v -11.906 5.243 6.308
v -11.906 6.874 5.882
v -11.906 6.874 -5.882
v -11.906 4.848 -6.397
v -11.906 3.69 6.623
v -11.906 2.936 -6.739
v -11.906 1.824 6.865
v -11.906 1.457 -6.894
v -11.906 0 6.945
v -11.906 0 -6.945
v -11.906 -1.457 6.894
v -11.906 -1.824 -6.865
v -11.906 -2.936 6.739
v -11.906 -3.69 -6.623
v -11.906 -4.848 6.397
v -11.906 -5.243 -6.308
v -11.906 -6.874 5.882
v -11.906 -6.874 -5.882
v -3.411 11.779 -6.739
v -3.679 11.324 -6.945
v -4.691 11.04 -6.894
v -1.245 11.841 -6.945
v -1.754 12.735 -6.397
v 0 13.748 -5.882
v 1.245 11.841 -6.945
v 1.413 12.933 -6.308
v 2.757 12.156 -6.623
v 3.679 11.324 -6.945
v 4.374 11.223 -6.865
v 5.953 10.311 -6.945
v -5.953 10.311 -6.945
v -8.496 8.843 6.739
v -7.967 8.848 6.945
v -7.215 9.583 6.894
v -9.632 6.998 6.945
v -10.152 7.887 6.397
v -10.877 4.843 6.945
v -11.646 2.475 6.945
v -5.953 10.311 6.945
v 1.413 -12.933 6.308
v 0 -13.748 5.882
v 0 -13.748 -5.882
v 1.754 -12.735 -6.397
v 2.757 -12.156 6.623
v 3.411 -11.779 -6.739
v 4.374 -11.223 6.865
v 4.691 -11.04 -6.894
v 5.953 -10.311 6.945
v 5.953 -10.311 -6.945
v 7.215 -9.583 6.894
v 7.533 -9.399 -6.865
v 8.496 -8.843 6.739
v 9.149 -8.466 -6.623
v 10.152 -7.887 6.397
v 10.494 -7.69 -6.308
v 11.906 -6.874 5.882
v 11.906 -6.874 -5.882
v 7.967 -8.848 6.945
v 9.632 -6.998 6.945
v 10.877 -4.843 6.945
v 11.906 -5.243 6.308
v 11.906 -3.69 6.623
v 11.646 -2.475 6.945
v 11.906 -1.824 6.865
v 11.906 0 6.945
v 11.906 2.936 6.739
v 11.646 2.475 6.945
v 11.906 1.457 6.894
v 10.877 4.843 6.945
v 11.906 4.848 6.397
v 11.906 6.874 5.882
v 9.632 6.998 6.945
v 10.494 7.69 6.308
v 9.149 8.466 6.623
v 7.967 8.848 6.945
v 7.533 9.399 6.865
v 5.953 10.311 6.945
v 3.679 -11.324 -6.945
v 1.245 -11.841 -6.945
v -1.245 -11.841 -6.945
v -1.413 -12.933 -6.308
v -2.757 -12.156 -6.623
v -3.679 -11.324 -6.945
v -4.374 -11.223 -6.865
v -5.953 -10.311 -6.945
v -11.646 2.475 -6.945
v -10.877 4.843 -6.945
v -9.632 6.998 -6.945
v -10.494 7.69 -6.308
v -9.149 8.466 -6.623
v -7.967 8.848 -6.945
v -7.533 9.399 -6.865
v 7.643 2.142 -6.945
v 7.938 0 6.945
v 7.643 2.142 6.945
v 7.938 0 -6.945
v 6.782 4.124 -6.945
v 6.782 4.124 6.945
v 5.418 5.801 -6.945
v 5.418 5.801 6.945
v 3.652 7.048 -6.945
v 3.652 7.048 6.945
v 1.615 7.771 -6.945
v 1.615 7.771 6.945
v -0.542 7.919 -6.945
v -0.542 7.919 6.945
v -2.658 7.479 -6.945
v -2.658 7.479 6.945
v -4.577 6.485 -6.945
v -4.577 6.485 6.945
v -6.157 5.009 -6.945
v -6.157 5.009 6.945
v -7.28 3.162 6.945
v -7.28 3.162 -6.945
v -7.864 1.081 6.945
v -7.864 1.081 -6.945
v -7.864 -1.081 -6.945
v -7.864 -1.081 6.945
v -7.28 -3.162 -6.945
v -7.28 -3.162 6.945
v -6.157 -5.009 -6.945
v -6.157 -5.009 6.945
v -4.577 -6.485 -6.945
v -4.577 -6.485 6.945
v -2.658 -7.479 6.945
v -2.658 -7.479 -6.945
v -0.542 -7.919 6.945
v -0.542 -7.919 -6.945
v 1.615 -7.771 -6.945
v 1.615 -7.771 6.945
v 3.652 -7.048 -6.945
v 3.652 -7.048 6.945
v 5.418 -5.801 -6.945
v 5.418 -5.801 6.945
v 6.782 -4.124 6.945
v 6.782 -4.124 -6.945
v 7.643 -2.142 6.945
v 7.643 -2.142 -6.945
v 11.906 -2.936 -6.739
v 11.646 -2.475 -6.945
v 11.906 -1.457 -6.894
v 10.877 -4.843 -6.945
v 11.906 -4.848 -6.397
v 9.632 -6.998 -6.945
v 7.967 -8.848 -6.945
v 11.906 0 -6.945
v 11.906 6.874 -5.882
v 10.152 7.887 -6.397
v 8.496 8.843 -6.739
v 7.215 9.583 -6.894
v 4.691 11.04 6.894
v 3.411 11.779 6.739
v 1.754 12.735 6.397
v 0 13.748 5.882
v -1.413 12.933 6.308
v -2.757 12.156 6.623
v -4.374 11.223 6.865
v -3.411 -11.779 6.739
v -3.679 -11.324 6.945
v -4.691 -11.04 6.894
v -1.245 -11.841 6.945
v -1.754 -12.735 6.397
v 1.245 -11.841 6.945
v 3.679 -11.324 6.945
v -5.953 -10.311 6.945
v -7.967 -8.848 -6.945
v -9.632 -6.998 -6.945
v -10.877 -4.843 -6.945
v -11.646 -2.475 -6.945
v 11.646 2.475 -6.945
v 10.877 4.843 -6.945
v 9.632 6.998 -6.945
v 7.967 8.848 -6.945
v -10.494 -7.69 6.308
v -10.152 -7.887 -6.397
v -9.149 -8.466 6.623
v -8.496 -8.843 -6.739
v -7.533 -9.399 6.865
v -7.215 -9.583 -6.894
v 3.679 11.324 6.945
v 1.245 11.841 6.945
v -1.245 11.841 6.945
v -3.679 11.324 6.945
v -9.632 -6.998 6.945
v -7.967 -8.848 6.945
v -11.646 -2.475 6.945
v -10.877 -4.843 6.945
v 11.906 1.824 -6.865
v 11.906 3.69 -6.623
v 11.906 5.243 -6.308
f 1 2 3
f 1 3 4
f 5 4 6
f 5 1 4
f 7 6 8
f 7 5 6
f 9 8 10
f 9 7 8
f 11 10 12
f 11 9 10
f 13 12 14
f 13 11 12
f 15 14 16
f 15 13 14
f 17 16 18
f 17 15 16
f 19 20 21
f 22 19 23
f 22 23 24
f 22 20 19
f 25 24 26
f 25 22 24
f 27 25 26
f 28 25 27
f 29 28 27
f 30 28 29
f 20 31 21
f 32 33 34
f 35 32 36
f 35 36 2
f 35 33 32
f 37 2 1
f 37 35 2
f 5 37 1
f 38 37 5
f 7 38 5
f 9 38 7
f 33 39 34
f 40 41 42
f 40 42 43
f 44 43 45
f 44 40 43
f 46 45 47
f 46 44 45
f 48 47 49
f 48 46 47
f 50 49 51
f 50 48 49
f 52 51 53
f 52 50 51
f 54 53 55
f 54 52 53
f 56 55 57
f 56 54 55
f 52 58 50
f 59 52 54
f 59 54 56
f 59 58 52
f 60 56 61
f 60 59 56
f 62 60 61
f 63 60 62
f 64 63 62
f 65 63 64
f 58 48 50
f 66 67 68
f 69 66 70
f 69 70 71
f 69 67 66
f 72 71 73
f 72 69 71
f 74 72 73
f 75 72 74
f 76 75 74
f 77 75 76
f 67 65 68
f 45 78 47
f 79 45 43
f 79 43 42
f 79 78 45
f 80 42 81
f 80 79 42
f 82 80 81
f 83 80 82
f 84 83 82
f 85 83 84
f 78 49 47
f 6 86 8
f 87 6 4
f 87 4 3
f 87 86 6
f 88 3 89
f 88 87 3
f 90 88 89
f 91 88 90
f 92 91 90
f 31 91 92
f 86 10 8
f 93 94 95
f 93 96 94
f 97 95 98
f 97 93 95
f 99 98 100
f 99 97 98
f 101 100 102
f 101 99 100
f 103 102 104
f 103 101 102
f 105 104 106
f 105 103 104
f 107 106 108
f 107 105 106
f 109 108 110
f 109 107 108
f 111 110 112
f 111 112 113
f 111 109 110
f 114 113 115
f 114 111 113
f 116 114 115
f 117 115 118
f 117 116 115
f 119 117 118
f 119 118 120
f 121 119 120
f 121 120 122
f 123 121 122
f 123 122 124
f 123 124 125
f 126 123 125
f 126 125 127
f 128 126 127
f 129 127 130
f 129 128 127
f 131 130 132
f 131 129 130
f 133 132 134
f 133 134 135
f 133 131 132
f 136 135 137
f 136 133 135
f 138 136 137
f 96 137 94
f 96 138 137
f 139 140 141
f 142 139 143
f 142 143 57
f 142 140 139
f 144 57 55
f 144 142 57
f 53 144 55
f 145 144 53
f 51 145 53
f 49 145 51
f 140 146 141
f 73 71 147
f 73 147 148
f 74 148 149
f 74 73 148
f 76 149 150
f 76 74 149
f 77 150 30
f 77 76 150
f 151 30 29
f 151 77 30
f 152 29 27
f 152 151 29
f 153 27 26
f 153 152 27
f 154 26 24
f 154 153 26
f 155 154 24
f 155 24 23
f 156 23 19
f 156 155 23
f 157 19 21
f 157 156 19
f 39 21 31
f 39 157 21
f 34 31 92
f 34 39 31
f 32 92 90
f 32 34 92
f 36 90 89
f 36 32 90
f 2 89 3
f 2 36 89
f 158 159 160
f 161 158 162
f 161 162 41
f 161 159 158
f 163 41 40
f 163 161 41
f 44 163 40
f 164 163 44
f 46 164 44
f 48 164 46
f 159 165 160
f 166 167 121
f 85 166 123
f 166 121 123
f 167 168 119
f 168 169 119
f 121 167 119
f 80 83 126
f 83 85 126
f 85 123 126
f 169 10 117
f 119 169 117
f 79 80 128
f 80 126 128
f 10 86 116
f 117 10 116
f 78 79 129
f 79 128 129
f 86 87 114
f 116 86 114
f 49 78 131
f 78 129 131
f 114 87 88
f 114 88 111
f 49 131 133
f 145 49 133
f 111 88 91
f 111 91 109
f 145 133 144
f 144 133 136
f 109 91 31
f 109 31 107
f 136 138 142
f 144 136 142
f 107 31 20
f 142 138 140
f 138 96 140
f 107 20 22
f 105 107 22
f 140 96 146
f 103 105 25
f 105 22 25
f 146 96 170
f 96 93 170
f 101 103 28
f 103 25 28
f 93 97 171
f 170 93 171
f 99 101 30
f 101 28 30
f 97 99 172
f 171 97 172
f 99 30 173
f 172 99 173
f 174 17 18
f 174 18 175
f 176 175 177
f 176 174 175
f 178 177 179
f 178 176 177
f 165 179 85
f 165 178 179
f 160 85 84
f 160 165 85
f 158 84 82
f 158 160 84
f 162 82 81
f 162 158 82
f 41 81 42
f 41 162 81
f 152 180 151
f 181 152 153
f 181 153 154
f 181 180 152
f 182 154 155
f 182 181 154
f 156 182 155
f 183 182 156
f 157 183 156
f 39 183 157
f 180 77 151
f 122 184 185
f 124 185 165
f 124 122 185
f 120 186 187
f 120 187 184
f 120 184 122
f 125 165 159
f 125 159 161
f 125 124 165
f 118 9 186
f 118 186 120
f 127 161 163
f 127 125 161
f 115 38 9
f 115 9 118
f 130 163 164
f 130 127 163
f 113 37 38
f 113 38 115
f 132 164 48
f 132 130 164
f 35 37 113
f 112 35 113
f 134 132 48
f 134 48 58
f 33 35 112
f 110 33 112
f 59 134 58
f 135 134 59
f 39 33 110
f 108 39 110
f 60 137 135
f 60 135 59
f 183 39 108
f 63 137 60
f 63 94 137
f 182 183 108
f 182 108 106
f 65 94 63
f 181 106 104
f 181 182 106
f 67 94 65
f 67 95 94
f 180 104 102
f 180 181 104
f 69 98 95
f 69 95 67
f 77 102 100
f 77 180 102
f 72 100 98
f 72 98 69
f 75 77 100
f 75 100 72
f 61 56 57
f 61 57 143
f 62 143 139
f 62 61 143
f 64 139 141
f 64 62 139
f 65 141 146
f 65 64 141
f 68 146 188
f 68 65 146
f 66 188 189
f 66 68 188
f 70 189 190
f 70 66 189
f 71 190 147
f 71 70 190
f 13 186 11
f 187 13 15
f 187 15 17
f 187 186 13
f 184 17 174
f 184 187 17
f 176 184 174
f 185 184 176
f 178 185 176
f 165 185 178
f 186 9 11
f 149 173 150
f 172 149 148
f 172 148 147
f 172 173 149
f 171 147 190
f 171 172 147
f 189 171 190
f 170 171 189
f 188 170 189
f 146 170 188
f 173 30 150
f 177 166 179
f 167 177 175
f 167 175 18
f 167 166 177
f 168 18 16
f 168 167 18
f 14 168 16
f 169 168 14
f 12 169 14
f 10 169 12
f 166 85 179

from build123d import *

# Parameters (mm, degrees)
SKETCH1_R               = 7.9375
EXTRUDE1_DEPTH          = 6.9453125
SKETCH7_OUTSIDE_W       = 121.588
SKETCH7_OUTSIDE_H       = 125.272
SKETCH7_OUTSIDE_R       = 11.90625
EXTRUDE2_DEPTH          = 25.4
EXTRUDE2_DRAFT          = -60
MIRROR1_COPY_1_SKETCH_W = 121.588
MIRROR1_COPY_1_SKETCH_H = 125.272
MIRROR1_COPY_1_SKETCH_R = 11.90625
MIRROR1_COPY_1_DEPTH    = 25.4
MIRROR1_COPY_1_DRAFT    = -60


with BuildPart() as part:
    # Sketch1 → Extrude1 (new, symmetric)
    with BuildSketch(Plane.XY):
        Polygon((-11.90625, 6.874076643), (-11.90625, -6.874076643), (0, -13.748153285), (11.90625, -6.874076643), (11.90625, 6.874076643), (0, 13.748153285), align=None)
        Circle(SKETCH1_R, mode=Mode.SUBTRACT)
    extrude(amount=EXTRUDE1_DEPTH, both=True)


with BuildPart() as extrude2_tool:
    # Sketch7 outside → Extrude2 (with draft: the straight prism first)
    with BuildSketch(Plane.XY.offset(6.9453125)):
        Rectangle(SKETCH7_OUTSIDE_W, SKETCH7_OUTSIDE_H)
        Circle(SKETCH7_OUTSIDE_R, mode=Mode.SUBTRACT)
    extrude(amount=-EXTRUDE2_DEPTH)
    # Extrude2: the draft: its side faces are tilted about the plane it starts from
    extrude2_sides = [extrude2_tool.faces().sort_by_distance(p)[0] for p in [
        (0, -62.636, -5.7546875),
        (60.794, 0, -5.7546875),
        (0, 62.636, -5.7546875),
        (-60.794, 0, -5.7546875),
        (-11.90625, 0, -5.7546875),
    ]]
    draft(extrude2_sides, Plane.XY.offset(6.9453125), EXTRUDE2_DRAFT)


with BuildPart() as part_1:
    add(part.part)

    # Extrude2: cut by extrude2_tool
    add(extrude2_tool.part, mode=Mode.SUBTRACT)


with BuildPart() as mirror1_copy_1_tool:
    # Mirror1 copy 1 sketch → Mirror1 copy 1 (with draft: the straight prism first)
    with BuildSketch(Plane(origin=(0, 0, -6.9453125), x_dir=(1, 0, 0), z_dir=(0, 0, -1))):
        Rectangle(MIRROR1_COPY_1_SKETCH_W, MIRROR1_COPY_1_SKETCH_H)
        Circle(MIRROR1_COPY_1_SKETCH_R, mode=Mode.SUBTRACT)
    extrude(amount=-MIRROR1_COPY_1_DEPTH)
    # Mirror1 copy 1: the draft: its side faces are tilted about the plane it starts from
    mirror1_copy_1_sides = [mirror1_copy_1_tool.faces().sort_by_distance(p)[0] for p in [
        (0, -62.636, 5.7546875),
        (60.794, 0, 5.7546875),
        (0, 62.636, 5.7546875),
        (-60.794, 0, 5.7546875),
        (-11.90625, 0, 5.7546875),
    ]]
    draft(mirror1_copy_1_sides, Plane(origin=(0, 0, -6.9453125), x_dir=(1, 0, 0), z_dir=(0, 0, -1)), MIRROR1_COPY_1_DRAFT)


with BuildPart() as part_2:
    add(part_1.part)

    # Mirror1 copy 1: cut by mirror1_copy_1_tool
    add(mirror1_copy_1_tool.part, mode=Mode.SUBTRACT)


solid = part_2.part
